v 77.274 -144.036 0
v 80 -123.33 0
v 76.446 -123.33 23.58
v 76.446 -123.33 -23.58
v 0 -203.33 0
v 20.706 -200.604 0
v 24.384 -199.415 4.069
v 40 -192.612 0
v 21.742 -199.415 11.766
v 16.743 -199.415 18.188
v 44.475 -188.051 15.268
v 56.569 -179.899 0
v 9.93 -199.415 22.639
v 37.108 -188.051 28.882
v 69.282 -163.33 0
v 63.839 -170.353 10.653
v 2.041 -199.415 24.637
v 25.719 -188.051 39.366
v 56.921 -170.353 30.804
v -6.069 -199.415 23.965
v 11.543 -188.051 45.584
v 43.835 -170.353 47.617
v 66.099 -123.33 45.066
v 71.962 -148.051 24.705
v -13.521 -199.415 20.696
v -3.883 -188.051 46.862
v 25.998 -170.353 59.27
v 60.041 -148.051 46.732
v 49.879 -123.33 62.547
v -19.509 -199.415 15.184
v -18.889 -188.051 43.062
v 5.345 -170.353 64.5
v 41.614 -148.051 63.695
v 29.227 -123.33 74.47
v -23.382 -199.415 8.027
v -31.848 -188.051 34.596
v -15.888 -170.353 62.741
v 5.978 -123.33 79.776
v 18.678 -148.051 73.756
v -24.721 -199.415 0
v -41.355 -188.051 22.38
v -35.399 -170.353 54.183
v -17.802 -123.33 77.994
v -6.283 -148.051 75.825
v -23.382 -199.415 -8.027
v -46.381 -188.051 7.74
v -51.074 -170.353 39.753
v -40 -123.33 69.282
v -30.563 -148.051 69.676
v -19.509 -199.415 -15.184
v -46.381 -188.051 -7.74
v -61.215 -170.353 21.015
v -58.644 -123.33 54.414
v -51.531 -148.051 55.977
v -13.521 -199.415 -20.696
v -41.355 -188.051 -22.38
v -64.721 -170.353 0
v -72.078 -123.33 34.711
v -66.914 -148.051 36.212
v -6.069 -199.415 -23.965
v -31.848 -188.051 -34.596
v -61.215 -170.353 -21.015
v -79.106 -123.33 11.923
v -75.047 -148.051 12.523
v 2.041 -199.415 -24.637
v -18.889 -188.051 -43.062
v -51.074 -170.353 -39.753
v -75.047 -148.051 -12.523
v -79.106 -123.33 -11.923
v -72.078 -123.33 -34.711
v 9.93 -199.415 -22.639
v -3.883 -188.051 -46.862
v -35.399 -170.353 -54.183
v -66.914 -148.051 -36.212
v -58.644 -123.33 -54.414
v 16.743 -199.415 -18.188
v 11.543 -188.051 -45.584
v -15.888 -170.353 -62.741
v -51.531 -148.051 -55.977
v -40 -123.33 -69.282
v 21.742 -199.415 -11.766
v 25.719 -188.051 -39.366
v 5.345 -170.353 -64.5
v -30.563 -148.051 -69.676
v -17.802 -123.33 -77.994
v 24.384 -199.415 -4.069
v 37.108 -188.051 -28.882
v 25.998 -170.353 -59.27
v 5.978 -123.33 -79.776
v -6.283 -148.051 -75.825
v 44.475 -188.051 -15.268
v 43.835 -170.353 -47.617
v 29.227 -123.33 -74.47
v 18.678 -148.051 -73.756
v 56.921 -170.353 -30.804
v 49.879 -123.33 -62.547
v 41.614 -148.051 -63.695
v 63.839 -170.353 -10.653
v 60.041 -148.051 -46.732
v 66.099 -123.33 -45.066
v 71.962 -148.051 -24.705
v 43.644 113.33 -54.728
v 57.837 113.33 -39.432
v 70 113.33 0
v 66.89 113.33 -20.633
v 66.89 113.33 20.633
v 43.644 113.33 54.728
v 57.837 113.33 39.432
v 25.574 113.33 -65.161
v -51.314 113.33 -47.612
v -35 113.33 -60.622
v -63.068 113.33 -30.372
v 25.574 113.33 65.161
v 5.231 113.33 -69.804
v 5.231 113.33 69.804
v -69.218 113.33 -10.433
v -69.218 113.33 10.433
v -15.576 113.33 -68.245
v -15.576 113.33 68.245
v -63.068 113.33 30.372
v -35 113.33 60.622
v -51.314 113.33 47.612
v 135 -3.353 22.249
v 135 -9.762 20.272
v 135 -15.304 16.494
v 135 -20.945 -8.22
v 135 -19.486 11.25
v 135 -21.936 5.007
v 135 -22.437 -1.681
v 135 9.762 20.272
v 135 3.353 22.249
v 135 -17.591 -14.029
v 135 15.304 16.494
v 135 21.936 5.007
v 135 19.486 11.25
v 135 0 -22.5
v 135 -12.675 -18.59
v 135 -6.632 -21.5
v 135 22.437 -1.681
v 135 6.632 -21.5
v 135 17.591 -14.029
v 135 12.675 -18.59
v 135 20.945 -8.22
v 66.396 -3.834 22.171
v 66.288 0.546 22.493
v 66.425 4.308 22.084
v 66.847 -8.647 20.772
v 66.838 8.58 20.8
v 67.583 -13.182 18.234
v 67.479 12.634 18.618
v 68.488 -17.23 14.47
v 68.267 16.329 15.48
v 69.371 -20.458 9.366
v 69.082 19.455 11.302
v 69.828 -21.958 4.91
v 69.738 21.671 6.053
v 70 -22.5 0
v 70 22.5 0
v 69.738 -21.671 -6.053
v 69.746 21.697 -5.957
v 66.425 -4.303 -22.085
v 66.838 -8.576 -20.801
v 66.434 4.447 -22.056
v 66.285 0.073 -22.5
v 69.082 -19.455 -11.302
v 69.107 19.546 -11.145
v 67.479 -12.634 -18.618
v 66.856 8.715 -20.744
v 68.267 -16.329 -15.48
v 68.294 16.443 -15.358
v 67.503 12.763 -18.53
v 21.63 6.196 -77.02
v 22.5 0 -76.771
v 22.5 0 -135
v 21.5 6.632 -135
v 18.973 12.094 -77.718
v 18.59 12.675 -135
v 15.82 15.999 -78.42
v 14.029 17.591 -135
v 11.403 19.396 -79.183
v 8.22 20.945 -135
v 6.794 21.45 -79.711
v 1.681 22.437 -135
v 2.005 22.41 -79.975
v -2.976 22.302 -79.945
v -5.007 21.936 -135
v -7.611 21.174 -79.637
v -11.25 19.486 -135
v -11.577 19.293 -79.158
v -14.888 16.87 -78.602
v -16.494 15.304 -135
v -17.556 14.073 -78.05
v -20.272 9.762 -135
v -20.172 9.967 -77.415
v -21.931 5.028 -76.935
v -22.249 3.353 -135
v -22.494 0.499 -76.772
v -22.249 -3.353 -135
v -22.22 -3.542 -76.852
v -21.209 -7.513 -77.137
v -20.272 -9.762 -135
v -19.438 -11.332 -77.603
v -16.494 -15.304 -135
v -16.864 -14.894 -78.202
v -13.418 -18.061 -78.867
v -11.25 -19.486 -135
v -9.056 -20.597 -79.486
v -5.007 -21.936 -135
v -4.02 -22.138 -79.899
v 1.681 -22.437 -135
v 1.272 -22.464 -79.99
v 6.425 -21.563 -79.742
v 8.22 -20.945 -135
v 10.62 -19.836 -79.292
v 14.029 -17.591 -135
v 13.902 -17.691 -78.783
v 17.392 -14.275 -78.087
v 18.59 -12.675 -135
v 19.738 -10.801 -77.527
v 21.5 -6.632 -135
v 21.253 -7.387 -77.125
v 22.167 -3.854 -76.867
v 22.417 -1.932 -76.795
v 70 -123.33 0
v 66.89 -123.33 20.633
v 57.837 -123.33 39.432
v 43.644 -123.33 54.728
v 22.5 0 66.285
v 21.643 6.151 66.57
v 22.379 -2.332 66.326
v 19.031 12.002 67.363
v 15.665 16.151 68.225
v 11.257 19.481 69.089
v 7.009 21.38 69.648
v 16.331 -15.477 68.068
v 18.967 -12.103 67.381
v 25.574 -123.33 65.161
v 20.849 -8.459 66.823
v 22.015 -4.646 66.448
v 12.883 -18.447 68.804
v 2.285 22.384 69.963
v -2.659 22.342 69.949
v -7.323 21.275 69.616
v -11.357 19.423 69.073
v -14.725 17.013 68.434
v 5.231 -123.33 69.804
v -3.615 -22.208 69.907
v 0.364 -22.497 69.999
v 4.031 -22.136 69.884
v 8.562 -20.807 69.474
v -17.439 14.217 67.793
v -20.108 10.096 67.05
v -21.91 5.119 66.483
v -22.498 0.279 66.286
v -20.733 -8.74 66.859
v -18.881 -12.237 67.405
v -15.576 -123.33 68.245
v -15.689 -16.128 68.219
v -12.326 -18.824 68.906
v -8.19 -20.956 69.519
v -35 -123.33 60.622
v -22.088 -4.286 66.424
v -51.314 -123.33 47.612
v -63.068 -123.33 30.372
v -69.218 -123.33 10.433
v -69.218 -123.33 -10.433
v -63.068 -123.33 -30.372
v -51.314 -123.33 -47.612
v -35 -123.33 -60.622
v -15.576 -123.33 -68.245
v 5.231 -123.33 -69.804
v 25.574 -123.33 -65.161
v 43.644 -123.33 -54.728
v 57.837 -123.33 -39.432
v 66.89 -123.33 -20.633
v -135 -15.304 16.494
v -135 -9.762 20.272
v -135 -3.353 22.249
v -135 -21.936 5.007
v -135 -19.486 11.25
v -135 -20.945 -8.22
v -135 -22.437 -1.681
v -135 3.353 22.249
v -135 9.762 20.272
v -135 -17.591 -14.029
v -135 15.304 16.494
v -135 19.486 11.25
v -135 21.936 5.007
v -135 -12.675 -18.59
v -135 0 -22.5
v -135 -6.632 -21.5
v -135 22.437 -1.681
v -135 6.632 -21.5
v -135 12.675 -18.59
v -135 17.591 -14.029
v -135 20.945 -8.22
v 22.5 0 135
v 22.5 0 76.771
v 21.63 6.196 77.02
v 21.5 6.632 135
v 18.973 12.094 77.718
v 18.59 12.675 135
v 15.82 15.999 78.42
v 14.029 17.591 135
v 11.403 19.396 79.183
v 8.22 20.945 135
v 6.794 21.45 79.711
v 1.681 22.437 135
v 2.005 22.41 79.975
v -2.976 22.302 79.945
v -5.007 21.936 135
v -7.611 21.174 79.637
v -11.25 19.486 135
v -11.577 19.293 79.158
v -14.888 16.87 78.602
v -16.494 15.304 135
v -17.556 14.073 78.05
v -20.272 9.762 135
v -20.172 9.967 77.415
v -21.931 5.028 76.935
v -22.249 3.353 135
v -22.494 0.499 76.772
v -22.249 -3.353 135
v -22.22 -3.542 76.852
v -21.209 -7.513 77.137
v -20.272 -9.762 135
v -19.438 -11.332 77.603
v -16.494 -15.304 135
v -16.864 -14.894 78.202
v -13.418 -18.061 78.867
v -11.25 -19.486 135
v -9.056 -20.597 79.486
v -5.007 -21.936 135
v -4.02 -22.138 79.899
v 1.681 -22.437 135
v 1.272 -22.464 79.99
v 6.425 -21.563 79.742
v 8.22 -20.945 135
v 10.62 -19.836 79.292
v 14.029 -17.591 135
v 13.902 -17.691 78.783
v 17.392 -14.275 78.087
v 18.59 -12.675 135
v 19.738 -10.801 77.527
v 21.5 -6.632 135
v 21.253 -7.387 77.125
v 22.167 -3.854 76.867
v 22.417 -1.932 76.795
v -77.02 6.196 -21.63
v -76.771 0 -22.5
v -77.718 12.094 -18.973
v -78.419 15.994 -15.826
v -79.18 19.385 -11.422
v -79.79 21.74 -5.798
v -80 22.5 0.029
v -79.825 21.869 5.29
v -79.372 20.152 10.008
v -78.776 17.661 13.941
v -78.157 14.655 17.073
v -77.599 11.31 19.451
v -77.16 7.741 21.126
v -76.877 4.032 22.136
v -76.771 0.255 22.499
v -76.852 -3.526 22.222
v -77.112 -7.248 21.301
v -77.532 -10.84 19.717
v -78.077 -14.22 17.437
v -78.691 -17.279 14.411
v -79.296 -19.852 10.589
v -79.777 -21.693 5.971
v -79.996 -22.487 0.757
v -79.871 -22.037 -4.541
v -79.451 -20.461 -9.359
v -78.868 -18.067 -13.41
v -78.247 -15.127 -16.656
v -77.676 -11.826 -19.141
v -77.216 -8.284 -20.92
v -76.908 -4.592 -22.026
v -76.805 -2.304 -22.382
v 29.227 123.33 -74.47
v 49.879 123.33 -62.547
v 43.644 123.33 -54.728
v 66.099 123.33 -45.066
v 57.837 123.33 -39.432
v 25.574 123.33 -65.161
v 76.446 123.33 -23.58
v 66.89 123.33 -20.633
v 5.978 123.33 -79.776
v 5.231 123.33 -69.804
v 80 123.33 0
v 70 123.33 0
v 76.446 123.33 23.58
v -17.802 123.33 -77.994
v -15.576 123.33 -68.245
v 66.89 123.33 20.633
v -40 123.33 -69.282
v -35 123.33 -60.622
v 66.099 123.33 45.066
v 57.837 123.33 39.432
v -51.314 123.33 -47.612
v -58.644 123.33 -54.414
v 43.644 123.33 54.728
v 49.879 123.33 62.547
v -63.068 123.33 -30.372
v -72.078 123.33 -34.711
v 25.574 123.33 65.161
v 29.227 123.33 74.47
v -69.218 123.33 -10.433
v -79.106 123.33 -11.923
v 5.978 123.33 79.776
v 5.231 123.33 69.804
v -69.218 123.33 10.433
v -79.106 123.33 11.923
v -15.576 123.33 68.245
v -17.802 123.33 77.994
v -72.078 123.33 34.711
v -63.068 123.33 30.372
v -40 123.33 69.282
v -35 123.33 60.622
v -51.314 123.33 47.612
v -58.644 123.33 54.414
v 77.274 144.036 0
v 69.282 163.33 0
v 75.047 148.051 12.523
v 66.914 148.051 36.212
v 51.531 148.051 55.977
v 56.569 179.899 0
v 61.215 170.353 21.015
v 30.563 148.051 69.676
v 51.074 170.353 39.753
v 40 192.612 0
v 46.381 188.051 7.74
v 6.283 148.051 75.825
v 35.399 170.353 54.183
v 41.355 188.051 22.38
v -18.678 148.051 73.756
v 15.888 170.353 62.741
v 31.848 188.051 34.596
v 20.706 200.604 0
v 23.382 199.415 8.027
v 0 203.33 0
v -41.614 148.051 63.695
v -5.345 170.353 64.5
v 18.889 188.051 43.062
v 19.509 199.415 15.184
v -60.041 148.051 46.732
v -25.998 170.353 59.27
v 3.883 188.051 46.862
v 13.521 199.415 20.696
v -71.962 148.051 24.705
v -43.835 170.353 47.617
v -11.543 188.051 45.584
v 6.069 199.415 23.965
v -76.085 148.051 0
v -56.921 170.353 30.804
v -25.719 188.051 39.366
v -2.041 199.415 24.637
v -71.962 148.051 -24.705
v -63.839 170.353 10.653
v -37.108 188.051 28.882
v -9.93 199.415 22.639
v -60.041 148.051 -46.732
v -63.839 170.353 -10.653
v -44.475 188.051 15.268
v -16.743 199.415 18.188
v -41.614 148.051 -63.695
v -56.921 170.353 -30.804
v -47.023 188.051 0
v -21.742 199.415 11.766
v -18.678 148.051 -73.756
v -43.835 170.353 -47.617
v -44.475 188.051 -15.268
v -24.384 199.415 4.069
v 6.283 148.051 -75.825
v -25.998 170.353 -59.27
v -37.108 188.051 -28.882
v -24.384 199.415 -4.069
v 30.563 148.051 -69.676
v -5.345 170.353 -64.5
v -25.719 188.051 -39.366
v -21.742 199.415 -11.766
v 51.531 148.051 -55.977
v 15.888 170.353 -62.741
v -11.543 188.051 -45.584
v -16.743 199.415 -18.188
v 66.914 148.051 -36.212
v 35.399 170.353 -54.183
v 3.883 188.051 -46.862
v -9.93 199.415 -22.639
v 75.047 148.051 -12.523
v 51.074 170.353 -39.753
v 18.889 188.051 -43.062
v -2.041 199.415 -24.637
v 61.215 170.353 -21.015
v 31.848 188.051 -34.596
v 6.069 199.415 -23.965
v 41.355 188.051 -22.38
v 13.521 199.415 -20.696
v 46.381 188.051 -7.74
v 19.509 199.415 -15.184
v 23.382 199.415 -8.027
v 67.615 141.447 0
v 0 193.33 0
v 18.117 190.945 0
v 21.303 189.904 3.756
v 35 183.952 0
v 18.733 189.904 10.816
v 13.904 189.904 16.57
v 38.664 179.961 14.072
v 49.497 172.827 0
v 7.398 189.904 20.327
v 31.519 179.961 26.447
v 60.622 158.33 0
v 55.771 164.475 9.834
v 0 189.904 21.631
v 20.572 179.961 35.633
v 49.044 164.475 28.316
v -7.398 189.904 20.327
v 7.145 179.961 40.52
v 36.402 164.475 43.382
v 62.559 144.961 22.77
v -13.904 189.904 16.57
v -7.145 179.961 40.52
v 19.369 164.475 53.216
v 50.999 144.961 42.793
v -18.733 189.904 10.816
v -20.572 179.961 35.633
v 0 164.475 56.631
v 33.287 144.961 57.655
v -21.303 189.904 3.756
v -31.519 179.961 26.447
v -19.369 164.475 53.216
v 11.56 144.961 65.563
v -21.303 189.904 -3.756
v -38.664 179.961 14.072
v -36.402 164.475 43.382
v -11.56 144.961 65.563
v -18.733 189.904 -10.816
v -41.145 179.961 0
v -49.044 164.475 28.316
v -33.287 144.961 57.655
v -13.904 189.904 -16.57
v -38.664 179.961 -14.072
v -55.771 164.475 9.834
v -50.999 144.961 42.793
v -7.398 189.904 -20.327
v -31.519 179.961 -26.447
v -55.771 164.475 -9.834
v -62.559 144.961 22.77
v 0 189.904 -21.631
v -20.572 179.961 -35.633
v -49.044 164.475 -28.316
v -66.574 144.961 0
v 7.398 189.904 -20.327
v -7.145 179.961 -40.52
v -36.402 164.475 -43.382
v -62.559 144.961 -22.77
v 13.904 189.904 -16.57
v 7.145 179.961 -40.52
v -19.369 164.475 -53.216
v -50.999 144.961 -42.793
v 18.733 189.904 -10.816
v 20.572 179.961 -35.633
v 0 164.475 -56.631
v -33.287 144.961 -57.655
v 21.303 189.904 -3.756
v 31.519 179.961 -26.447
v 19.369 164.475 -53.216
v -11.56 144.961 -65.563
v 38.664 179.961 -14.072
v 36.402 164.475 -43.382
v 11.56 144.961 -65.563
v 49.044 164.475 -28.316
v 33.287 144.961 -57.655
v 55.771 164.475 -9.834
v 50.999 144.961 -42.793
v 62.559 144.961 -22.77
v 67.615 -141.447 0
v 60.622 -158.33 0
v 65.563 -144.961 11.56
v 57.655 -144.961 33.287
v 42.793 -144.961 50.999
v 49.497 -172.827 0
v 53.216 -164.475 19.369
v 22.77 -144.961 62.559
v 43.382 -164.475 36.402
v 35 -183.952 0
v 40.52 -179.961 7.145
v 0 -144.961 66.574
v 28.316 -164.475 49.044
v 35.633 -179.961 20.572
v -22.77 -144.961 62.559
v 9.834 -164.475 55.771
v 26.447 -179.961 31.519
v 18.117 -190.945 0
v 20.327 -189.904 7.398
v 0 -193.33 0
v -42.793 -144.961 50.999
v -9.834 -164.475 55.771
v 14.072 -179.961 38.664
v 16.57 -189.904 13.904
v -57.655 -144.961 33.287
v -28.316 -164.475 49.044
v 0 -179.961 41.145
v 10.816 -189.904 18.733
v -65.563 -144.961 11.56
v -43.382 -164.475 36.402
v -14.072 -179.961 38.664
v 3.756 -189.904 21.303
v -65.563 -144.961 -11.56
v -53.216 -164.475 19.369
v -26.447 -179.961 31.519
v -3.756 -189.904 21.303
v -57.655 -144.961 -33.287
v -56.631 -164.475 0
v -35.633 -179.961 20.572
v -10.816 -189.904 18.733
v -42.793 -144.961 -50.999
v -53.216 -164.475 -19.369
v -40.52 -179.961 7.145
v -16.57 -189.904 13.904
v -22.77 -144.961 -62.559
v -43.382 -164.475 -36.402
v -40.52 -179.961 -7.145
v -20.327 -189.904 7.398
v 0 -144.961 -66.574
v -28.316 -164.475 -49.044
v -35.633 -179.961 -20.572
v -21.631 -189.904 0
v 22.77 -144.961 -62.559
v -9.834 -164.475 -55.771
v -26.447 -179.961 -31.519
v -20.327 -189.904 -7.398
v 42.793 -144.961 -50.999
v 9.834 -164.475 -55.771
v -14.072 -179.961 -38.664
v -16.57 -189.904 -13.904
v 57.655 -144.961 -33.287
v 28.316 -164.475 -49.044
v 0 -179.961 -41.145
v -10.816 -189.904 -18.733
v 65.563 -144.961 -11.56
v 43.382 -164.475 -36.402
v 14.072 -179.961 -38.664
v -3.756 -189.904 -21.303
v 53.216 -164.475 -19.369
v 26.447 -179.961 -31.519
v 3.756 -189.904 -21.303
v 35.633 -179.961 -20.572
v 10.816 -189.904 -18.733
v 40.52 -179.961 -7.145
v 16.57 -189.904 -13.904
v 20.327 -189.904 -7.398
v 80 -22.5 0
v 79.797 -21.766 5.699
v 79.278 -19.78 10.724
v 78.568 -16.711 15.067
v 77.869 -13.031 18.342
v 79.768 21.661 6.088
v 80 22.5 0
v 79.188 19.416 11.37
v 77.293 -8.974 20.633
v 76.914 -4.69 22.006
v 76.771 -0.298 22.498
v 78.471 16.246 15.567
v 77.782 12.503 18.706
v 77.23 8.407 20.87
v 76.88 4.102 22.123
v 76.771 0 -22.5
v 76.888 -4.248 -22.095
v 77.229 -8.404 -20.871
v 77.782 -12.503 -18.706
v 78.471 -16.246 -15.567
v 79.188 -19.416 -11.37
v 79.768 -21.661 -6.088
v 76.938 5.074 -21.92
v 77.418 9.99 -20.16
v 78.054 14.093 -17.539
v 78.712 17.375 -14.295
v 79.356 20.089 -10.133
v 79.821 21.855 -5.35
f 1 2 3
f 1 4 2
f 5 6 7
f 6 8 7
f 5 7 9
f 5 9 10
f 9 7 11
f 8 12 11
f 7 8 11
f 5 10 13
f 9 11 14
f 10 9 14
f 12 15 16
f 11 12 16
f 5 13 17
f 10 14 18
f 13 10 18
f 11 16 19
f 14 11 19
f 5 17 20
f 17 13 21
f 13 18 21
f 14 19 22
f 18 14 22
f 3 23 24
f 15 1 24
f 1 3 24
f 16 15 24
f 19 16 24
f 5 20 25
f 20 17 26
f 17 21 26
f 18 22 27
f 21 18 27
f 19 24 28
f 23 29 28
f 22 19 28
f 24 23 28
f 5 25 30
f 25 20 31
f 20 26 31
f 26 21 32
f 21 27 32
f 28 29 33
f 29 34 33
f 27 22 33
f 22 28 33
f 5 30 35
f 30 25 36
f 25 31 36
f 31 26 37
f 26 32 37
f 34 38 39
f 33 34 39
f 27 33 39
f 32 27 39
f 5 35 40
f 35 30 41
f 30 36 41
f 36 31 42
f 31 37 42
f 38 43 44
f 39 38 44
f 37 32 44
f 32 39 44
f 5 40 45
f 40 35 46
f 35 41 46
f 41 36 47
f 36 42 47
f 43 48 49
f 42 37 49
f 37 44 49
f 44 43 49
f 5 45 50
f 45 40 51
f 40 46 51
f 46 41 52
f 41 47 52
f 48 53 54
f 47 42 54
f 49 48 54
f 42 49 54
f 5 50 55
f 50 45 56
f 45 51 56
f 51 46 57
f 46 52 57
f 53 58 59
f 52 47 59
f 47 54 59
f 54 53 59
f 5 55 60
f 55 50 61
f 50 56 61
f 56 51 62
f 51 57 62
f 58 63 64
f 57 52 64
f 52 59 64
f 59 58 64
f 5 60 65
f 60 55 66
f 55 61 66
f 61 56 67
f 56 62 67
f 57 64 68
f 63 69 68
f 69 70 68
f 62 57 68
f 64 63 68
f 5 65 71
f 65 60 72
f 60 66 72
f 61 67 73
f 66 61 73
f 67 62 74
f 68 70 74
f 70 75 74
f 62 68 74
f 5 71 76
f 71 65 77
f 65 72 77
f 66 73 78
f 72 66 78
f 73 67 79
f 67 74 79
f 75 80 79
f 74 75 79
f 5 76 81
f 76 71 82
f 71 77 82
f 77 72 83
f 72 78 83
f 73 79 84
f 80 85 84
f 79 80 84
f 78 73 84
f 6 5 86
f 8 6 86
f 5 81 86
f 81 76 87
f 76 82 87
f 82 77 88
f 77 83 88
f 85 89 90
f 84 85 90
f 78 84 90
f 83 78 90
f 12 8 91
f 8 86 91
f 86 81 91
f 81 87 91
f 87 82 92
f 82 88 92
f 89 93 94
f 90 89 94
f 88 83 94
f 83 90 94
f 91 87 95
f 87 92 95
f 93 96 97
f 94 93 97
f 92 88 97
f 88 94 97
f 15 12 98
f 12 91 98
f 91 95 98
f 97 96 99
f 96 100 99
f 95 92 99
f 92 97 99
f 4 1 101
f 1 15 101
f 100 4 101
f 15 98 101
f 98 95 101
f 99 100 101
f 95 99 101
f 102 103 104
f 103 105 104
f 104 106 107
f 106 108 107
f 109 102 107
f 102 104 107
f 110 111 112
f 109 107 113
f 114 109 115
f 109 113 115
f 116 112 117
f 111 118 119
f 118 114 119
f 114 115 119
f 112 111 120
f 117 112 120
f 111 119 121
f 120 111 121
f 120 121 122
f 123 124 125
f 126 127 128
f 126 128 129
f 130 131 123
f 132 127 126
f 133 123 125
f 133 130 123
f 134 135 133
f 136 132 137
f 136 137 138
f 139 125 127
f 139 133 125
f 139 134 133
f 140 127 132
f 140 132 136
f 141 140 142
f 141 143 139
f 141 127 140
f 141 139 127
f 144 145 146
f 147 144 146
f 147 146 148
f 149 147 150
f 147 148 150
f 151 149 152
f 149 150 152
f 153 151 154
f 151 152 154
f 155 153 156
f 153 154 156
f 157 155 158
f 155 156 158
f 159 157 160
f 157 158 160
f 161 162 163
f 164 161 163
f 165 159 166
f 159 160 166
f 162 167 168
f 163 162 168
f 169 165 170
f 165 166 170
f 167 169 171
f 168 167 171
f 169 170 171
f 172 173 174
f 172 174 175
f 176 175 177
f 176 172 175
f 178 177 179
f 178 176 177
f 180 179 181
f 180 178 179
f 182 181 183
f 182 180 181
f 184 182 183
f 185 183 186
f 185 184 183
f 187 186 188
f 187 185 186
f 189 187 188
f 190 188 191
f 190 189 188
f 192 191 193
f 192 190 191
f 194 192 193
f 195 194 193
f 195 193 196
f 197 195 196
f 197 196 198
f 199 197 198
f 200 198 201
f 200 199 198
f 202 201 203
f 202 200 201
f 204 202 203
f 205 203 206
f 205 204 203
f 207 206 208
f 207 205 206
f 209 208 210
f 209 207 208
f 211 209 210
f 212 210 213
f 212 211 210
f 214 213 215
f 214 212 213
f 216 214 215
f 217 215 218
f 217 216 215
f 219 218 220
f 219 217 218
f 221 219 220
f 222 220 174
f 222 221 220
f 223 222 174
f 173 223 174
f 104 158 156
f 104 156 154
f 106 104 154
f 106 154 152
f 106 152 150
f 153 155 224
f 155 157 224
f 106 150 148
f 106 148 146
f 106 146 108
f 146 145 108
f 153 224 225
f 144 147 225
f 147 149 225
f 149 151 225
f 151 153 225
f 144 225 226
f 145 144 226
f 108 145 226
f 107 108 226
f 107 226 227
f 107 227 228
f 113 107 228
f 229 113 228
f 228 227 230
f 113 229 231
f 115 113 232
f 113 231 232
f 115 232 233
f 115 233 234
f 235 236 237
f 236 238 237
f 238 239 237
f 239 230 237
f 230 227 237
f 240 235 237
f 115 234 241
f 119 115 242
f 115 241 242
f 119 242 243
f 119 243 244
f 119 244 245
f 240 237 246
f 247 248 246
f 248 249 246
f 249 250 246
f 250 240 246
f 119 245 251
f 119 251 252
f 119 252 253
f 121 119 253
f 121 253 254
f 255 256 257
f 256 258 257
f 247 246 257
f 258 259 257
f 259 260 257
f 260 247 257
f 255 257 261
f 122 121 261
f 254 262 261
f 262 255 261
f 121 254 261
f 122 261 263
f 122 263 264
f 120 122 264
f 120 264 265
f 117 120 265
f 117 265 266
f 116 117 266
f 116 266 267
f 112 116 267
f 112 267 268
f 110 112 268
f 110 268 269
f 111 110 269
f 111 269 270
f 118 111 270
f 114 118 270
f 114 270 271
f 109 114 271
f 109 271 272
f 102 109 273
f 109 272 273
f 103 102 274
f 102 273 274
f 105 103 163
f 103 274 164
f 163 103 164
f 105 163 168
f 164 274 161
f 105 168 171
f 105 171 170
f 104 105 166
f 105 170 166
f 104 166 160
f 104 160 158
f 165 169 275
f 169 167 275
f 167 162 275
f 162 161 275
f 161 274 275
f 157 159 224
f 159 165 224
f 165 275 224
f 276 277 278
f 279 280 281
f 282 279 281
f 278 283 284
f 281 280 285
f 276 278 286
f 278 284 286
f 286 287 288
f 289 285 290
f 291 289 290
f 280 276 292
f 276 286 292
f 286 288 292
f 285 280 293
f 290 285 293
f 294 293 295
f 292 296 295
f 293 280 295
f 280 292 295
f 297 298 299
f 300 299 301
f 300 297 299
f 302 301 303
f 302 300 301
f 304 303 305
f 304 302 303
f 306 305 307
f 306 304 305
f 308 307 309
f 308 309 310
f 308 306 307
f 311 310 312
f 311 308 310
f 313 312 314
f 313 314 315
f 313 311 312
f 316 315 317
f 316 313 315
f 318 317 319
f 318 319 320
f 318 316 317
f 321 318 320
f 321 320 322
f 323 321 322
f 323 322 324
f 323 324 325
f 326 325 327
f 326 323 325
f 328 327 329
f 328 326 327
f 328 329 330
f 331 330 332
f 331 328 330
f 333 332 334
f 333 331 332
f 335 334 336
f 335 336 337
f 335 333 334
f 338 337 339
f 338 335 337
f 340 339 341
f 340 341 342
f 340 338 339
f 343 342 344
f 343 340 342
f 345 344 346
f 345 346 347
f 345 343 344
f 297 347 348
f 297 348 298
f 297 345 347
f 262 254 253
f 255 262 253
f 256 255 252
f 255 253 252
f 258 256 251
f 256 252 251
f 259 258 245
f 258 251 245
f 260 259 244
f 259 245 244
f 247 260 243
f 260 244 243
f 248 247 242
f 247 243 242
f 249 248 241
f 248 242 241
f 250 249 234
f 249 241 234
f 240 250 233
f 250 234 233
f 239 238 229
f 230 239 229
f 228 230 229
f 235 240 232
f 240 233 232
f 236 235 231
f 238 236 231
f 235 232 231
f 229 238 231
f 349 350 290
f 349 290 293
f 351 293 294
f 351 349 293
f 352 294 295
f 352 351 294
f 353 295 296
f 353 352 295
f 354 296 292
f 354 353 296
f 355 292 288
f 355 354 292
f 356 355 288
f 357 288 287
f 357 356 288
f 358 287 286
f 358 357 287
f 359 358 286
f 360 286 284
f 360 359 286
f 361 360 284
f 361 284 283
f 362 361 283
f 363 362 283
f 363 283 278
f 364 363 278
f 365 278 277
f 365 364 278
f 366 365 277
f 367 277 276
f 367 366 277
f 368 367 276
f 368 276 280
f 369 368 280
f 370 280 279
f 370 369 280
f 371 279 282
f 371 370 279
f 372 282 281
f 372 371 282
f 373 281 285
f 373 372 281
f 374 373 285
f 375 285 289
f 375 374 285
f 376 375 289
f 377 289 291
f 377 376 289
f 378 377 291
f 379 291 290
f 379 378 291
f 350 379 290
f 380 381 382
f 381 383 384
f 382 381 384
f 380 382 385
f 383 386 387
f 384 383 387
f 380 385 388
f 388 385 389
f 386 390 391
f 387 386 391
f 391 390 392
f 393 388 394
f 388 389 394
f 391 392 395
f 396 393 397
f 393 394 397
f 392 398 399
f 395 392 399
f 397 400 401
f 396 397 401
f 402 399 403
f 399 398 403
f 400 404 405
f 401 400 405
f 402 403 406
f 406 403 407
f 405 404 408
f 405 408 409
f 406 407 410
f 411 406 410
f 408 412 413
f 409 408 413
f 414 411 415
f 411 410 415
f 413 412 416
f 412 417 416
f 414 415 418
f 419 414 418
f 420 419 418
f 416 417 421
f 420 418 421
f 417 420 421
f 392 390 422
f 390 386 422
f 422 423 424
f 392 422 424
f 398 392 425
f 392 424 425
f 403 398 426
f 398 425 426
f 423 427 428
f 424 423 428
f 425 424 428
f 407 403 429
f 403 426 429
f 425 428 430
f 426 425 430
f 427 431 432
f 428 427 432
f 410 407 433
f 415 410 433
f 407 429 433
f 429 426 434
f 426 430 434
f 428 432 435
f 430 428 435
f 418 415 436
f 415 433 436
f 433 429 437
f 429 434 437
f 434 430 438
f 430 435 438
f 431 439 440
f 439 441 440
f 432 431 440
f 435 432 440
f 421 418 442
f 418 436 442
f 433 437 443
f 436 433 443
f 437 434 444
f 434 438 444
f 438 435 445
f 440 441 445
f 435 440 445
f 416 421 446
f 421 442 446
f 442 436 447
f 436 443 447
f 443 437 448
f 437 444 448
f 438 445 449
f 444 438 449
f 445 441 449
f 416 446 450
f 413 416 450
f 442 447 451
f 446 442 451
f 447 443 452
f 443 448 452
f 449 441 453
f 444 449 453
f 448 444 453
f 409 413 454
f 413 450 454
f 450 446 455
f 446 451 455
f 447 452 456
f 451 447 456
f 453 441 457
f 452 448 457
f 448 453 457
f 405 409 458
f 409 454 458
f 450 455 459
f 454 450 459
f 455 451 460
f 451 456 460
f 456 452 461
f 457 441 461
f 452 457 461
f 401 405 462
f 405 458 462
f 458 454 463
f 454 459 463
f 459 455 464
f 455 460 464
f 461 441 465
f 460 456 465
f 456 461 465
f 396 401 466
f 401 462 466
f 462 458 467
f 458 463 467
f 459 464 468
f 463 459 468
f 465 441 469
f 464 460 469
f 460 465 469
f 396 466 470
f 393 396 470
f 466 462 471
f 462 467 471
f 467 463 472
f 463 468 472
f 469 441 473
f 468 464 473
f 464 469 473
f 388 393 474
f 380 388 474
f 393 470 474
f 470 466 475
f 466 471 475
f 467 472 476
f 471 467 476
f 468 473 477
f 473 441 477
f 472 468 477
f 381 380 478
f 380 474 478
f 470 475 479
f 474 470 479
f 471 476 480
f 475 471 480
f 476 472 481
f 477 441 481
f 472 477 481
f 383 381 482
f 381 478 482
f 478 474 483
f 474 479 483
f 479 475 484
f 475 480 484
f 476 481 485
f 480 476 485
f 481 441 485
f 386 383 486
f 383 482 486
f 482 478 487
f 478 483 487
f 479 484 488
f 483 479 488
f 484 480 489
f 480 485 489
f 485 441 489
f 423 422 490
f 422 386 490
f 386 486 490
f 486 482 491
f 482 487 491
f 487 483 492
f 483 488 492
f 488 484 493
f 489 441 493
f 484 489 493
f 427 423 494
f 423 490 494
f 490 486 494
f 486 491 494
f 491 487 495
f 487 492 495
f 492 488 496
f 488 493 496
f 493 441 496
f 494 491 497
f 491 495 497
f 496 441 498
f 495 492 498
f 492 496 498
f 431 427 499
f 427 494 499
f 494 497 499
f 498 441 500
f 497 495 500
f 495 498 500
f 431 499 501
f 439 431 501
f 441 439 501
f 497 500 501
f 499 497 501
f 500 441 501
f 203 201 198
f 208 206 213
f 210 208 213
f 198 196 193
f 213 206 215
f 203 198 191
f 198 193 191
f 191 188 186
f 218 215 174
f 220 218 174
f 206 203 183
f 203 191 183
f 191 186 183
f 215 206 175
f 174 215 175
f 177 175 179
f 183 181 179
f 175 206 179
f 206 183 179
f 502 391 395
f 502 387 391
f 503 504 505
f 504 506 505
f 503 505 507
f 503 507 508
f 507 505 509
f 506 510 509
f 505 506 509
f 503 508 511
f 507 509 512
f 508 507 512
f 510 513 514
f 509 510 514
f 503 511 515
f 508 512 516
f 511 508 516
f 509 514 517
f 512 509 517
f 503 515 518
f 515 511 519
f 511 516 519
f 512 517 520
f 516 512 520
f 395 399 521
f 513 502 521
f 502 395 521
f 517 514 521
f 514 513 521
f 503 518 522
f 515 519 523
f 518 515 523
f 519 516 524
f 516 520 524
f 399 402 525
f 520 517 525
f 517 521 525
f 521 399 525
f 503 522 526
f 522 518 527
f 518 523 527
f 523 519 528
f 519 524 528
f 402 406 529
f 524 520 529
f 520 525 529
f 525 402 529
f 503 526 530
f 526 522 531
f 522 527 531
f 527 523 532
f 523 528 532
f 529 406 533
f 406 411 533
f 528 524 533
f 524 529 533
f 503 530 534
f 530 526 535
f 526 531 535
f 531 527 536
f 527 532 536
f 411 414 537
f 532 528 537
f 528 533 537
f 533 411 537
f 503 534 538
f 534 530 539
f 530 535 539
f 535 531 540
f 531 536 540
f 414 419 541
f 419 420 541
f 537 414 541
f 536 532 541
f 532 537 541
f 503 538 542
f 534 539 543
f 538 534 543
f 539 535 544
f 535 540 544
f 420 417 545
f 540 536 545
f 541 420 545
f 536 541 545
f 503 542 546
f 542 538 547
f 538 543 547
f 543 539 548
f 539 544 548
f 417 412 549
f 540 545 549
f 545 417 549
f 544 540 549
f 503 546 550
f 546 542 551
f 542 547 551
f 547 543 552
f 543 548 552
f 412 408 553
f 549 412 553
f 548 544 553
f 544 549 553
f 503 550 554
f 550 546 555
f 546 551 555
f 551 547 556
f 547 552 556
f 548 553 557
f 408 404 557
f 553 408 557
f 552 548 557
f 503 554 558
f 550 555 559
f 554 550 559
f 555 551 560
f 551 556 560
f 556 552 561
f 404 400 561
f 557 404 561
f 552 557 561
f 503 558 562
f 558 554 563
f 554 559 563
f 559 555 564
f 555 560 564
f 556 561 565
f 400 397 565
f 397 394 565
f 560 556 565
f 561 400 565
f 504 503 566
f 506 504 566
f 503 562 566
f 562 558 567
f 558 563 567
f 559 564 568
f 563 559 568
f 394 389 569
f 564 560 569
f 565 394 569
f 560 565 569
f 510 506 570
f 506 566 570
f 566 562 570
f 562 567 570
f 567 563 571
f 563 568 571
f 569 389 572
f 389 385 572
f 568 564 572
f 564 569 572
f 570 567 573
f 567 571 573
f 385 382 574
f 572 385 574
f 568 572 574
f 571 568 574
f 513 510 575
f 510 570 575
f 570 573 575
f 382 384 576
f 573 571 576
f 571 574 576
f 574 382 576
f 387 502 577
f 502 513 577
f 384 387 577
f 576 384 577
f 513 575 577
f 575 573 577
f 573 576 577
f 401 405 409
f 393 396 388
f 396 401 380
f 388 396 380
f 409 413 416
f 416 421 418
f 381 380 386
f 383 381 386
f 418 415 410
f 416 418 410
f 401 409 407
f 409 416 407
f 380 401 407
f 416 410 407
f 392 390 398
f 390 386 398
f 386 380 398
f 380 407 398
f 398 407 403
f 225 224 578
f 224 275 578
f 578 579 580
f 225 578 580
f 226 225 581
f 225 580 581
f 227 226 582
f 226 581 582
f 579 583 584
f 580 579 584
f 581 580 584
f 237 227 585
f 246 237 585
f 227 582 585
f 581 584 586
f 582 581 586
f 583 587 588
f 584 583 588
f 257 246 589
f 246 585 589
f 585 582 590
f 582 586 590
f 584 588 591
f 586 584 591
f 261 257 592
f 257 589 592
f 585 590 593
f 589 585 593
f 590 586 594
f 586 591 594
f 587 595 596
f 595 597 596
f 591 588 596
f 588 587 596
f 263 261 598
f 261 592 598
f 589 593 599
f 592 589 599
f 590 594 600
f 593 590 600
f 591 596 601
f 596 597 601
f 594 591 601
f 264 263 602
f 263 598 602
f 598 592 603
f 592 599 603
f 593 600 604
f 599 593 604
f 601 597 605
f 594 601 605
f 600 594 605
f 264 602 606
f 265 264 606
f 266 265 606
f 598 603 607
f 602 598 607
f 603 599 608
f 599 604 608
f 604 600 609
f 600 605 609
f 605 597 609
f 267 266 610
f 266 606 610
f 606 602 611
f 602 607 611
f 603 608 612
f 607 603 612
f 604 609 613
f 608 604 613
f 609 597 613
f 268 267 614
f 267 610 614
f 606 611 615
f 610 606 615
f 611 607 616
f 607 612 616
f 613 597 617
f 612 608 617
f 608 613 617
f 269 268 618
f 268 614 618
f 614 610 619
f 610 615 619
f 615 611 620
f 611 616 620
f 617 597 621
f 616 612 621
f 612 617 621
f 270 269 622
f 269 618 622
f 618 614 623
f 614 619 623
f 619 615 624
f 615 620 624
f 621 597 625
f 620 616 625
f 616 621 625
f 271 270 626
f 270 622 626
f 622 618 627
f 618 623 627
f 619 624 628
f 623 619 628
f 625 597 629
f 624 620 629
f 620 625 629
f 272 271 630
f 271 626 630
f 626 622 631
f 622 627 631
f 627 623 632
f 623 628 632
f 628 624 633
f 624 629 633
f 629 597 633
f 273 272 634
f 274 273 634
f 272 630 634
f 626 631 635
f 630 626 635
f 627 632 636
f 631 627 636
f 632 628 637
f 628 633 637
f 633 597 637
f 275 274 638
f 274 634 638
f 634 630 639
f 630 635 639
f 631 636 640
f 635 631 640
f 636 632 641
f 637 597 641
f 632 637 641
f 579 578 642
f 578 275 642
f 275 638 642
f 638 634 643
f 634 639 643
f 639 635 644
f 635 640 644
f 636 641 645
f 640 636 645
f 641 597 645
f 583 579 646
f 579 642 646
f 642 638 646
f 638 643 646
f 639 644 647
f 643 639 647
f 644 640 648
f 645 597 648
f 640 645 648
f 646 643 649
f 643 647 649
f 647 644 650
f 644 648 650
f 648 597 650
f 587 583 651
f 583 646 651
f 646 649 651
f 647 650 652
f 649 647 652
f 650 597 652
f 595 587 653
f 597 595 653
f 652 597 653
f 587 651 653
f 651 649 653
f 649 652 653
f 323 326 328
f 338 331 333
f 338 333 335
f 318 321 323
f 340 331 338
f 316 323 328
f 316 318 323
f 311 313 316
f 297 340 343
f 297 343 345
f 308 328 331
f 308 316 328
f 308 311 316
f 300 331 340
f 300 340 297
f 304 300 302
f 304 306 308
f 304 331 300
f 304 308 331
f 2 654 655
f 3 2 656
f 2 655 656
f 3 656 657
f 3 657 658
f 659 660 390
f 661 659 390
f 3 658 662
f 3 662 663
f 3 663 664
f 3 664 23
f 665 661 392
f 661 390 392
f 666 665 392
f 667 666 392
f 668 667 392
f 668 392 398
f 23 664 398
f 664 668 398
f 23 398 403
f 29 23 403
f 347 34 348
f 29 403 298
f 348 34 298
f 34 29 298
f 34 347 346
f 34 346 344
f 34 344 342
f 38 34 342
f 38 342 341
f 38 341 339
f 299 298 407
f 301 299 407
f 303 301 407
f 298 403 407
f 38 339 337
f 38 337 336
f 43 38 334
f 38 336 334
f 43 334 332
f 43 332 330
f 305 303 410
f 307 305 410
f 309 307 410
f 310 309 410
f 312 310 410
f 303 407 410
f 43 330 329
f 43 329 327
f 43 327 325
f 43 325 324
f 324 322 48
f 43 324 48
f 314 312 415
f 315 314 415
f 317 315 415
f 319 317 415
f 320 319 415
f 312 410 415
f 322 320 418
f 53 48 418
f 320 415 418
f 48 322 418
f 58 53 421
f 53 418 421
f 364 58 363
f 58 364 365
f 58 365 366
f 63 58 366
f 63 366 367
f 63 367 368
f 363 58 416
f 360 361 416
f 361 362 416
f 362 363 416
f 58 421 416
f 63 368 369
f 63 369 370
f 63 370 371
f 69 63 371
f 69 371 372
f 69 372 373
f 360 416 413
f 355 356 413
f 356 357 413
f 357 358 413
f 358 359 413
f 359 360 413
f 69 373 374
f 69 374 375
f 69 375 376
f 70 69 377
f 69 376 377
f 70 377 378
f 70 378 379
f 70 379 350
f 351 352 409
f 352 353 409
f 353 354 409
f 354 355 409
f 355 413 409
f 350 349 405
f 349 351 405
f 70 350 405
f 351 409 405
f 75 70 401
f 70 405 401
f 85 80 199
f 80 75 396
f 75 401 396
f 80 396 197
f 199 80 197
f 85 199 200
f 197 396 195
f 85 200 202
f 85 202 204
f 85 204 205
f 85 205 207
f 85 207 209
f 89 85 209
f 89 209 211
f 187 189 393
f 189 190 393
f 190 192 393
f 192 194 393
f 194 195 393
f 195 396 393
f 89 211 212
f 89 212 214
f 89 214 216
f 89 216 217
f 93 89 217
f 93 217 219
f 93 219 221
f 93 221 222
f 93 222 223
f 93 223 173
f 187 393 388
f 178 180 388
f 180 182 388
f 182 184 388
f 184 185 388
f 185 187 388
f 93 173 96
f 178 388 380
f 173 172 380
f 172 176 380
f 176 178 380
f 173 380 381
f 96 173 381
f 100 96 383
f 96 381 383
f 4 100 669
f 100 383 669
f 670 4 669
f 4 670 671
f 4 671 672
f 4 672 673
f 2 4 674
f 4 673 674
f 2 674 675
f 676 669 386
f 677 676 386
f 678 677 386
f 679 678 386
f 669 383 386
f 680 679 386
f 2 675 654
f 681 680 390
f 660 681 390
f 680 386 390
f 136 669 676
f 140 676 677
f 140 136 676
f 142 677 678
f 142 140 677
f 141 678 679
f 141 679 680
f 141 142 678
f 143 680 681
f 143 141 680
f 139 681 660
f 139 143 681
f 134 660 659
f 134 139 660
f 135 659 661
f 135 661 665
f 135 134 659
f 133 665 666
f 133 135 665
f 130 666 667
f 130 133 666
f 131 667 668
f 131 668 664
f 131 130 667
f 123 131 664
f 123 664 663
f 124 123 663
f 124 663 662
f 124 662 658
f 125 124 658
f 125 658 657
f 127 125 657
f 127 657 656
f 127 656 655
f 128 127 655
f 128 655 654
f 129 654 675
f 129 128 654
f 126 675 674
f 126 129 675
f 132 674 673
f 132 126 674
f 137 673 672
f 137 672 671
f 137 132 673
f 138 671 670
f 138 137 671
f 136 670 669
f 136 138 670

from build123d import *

# Parameters (mm, degrees)
SKETCH1_W           = 10
SKETCH1_H           = 113.33
SKETCH3_R           = 22.5
BOSS_EXTRUDE1_DEPTH = 135
SKETCH5_R           = 22.5
BOSS_EXTRUDE3_DEPTH = 135
SKETCH6_R           = 70
CUT_EXTRUDE1_DEPTH  = 25


with BuildPart() as part:
    # Sketch1 → Revolve1 (revolve)
    with BuildSketch(Plane.XY):
        Polygon((80, 113.33), (80, 123.33), (70, 123.33), (0, 123.33), (0, 113.33), (70, 113.33), align=None)
        with Locations((75, 56.665)):
            Rectangle(SKETCH1_W, SKETCH1_H)
        with BuildLine():
            Line((80, -123.33), (80, 0))
            Line((80, 0), (70, 0))
            Line((70, 0), (70, -123.33))
            ThreePointArc((70, -123.33), (49.497474683, -172.827474683), (0, -193.33))
            Line((0, -193.33), (0, -203.33))
            ThreePointArc((0, -203.33), (56.568542495, -179.898542495), (80, -123.33))
        make_face()
    revolve(axis=Axis((0, 203.33, 0), (0, -1, 0)))



with BuildPart() as body_2:
    # Sketch1<3> → Revolve2 (revolve)
    with BuildSketch(Plane.XY):
        with BuildLine():
            Line((0, 203.33), (0, 193.33))
            ThreePointArc((0, 193.33), (49.497474683, 172.827474683), (70, 123.33))
            Line((70, 123.33), (80, 123.33))
            ThreePointArc((80, 123.33), (56.568542495, 179.898542495), (0, 203.33))
        make_face()
    revolve(axis=Axis((0, 203.33, 0), (0, -1, 0)))


with BuildPart() as body_3:
    # Sketch3 → Boss-Extrude1 (new body, symmetric)
    with BuildSketch(Plane.XY):
        Circle(SKETCH3_R)
    extrude(amount=BOSS_EXTRUDE1_DEPTH, both=True)


with BuildPart() as part_1:
    add(part.part)

    add(body_3.part)  # Boss-Extrude3 merges body 3
    # Sketch5 → Boss-Extrude3 (add, symmetric)
    with BuildSketch(Plane(origin=(0, 0, 0), x_dir=(0, 0, -1), z_dir=(1, 0, 0))):
        Circle(SKETCH5_R)
    extrude(amount=BOSS_EXTRUDE3_DEPTH, both=True)

    # Sketch6 → Cut-Extrude1 (cut, symmetric)
    with BuildSketch(Plane(origin=(0, 0, 0), x_dir=(1, 0, 0), z_dir=(0, 1, 0))):
        Circle(SKETCH6_R)
    extrude(amount=CUT_EXTRUDE1_DEPTH, both=True, mode=Mode.SUBTRACT)


solid = Compound([body_2.part, part_1.part])
